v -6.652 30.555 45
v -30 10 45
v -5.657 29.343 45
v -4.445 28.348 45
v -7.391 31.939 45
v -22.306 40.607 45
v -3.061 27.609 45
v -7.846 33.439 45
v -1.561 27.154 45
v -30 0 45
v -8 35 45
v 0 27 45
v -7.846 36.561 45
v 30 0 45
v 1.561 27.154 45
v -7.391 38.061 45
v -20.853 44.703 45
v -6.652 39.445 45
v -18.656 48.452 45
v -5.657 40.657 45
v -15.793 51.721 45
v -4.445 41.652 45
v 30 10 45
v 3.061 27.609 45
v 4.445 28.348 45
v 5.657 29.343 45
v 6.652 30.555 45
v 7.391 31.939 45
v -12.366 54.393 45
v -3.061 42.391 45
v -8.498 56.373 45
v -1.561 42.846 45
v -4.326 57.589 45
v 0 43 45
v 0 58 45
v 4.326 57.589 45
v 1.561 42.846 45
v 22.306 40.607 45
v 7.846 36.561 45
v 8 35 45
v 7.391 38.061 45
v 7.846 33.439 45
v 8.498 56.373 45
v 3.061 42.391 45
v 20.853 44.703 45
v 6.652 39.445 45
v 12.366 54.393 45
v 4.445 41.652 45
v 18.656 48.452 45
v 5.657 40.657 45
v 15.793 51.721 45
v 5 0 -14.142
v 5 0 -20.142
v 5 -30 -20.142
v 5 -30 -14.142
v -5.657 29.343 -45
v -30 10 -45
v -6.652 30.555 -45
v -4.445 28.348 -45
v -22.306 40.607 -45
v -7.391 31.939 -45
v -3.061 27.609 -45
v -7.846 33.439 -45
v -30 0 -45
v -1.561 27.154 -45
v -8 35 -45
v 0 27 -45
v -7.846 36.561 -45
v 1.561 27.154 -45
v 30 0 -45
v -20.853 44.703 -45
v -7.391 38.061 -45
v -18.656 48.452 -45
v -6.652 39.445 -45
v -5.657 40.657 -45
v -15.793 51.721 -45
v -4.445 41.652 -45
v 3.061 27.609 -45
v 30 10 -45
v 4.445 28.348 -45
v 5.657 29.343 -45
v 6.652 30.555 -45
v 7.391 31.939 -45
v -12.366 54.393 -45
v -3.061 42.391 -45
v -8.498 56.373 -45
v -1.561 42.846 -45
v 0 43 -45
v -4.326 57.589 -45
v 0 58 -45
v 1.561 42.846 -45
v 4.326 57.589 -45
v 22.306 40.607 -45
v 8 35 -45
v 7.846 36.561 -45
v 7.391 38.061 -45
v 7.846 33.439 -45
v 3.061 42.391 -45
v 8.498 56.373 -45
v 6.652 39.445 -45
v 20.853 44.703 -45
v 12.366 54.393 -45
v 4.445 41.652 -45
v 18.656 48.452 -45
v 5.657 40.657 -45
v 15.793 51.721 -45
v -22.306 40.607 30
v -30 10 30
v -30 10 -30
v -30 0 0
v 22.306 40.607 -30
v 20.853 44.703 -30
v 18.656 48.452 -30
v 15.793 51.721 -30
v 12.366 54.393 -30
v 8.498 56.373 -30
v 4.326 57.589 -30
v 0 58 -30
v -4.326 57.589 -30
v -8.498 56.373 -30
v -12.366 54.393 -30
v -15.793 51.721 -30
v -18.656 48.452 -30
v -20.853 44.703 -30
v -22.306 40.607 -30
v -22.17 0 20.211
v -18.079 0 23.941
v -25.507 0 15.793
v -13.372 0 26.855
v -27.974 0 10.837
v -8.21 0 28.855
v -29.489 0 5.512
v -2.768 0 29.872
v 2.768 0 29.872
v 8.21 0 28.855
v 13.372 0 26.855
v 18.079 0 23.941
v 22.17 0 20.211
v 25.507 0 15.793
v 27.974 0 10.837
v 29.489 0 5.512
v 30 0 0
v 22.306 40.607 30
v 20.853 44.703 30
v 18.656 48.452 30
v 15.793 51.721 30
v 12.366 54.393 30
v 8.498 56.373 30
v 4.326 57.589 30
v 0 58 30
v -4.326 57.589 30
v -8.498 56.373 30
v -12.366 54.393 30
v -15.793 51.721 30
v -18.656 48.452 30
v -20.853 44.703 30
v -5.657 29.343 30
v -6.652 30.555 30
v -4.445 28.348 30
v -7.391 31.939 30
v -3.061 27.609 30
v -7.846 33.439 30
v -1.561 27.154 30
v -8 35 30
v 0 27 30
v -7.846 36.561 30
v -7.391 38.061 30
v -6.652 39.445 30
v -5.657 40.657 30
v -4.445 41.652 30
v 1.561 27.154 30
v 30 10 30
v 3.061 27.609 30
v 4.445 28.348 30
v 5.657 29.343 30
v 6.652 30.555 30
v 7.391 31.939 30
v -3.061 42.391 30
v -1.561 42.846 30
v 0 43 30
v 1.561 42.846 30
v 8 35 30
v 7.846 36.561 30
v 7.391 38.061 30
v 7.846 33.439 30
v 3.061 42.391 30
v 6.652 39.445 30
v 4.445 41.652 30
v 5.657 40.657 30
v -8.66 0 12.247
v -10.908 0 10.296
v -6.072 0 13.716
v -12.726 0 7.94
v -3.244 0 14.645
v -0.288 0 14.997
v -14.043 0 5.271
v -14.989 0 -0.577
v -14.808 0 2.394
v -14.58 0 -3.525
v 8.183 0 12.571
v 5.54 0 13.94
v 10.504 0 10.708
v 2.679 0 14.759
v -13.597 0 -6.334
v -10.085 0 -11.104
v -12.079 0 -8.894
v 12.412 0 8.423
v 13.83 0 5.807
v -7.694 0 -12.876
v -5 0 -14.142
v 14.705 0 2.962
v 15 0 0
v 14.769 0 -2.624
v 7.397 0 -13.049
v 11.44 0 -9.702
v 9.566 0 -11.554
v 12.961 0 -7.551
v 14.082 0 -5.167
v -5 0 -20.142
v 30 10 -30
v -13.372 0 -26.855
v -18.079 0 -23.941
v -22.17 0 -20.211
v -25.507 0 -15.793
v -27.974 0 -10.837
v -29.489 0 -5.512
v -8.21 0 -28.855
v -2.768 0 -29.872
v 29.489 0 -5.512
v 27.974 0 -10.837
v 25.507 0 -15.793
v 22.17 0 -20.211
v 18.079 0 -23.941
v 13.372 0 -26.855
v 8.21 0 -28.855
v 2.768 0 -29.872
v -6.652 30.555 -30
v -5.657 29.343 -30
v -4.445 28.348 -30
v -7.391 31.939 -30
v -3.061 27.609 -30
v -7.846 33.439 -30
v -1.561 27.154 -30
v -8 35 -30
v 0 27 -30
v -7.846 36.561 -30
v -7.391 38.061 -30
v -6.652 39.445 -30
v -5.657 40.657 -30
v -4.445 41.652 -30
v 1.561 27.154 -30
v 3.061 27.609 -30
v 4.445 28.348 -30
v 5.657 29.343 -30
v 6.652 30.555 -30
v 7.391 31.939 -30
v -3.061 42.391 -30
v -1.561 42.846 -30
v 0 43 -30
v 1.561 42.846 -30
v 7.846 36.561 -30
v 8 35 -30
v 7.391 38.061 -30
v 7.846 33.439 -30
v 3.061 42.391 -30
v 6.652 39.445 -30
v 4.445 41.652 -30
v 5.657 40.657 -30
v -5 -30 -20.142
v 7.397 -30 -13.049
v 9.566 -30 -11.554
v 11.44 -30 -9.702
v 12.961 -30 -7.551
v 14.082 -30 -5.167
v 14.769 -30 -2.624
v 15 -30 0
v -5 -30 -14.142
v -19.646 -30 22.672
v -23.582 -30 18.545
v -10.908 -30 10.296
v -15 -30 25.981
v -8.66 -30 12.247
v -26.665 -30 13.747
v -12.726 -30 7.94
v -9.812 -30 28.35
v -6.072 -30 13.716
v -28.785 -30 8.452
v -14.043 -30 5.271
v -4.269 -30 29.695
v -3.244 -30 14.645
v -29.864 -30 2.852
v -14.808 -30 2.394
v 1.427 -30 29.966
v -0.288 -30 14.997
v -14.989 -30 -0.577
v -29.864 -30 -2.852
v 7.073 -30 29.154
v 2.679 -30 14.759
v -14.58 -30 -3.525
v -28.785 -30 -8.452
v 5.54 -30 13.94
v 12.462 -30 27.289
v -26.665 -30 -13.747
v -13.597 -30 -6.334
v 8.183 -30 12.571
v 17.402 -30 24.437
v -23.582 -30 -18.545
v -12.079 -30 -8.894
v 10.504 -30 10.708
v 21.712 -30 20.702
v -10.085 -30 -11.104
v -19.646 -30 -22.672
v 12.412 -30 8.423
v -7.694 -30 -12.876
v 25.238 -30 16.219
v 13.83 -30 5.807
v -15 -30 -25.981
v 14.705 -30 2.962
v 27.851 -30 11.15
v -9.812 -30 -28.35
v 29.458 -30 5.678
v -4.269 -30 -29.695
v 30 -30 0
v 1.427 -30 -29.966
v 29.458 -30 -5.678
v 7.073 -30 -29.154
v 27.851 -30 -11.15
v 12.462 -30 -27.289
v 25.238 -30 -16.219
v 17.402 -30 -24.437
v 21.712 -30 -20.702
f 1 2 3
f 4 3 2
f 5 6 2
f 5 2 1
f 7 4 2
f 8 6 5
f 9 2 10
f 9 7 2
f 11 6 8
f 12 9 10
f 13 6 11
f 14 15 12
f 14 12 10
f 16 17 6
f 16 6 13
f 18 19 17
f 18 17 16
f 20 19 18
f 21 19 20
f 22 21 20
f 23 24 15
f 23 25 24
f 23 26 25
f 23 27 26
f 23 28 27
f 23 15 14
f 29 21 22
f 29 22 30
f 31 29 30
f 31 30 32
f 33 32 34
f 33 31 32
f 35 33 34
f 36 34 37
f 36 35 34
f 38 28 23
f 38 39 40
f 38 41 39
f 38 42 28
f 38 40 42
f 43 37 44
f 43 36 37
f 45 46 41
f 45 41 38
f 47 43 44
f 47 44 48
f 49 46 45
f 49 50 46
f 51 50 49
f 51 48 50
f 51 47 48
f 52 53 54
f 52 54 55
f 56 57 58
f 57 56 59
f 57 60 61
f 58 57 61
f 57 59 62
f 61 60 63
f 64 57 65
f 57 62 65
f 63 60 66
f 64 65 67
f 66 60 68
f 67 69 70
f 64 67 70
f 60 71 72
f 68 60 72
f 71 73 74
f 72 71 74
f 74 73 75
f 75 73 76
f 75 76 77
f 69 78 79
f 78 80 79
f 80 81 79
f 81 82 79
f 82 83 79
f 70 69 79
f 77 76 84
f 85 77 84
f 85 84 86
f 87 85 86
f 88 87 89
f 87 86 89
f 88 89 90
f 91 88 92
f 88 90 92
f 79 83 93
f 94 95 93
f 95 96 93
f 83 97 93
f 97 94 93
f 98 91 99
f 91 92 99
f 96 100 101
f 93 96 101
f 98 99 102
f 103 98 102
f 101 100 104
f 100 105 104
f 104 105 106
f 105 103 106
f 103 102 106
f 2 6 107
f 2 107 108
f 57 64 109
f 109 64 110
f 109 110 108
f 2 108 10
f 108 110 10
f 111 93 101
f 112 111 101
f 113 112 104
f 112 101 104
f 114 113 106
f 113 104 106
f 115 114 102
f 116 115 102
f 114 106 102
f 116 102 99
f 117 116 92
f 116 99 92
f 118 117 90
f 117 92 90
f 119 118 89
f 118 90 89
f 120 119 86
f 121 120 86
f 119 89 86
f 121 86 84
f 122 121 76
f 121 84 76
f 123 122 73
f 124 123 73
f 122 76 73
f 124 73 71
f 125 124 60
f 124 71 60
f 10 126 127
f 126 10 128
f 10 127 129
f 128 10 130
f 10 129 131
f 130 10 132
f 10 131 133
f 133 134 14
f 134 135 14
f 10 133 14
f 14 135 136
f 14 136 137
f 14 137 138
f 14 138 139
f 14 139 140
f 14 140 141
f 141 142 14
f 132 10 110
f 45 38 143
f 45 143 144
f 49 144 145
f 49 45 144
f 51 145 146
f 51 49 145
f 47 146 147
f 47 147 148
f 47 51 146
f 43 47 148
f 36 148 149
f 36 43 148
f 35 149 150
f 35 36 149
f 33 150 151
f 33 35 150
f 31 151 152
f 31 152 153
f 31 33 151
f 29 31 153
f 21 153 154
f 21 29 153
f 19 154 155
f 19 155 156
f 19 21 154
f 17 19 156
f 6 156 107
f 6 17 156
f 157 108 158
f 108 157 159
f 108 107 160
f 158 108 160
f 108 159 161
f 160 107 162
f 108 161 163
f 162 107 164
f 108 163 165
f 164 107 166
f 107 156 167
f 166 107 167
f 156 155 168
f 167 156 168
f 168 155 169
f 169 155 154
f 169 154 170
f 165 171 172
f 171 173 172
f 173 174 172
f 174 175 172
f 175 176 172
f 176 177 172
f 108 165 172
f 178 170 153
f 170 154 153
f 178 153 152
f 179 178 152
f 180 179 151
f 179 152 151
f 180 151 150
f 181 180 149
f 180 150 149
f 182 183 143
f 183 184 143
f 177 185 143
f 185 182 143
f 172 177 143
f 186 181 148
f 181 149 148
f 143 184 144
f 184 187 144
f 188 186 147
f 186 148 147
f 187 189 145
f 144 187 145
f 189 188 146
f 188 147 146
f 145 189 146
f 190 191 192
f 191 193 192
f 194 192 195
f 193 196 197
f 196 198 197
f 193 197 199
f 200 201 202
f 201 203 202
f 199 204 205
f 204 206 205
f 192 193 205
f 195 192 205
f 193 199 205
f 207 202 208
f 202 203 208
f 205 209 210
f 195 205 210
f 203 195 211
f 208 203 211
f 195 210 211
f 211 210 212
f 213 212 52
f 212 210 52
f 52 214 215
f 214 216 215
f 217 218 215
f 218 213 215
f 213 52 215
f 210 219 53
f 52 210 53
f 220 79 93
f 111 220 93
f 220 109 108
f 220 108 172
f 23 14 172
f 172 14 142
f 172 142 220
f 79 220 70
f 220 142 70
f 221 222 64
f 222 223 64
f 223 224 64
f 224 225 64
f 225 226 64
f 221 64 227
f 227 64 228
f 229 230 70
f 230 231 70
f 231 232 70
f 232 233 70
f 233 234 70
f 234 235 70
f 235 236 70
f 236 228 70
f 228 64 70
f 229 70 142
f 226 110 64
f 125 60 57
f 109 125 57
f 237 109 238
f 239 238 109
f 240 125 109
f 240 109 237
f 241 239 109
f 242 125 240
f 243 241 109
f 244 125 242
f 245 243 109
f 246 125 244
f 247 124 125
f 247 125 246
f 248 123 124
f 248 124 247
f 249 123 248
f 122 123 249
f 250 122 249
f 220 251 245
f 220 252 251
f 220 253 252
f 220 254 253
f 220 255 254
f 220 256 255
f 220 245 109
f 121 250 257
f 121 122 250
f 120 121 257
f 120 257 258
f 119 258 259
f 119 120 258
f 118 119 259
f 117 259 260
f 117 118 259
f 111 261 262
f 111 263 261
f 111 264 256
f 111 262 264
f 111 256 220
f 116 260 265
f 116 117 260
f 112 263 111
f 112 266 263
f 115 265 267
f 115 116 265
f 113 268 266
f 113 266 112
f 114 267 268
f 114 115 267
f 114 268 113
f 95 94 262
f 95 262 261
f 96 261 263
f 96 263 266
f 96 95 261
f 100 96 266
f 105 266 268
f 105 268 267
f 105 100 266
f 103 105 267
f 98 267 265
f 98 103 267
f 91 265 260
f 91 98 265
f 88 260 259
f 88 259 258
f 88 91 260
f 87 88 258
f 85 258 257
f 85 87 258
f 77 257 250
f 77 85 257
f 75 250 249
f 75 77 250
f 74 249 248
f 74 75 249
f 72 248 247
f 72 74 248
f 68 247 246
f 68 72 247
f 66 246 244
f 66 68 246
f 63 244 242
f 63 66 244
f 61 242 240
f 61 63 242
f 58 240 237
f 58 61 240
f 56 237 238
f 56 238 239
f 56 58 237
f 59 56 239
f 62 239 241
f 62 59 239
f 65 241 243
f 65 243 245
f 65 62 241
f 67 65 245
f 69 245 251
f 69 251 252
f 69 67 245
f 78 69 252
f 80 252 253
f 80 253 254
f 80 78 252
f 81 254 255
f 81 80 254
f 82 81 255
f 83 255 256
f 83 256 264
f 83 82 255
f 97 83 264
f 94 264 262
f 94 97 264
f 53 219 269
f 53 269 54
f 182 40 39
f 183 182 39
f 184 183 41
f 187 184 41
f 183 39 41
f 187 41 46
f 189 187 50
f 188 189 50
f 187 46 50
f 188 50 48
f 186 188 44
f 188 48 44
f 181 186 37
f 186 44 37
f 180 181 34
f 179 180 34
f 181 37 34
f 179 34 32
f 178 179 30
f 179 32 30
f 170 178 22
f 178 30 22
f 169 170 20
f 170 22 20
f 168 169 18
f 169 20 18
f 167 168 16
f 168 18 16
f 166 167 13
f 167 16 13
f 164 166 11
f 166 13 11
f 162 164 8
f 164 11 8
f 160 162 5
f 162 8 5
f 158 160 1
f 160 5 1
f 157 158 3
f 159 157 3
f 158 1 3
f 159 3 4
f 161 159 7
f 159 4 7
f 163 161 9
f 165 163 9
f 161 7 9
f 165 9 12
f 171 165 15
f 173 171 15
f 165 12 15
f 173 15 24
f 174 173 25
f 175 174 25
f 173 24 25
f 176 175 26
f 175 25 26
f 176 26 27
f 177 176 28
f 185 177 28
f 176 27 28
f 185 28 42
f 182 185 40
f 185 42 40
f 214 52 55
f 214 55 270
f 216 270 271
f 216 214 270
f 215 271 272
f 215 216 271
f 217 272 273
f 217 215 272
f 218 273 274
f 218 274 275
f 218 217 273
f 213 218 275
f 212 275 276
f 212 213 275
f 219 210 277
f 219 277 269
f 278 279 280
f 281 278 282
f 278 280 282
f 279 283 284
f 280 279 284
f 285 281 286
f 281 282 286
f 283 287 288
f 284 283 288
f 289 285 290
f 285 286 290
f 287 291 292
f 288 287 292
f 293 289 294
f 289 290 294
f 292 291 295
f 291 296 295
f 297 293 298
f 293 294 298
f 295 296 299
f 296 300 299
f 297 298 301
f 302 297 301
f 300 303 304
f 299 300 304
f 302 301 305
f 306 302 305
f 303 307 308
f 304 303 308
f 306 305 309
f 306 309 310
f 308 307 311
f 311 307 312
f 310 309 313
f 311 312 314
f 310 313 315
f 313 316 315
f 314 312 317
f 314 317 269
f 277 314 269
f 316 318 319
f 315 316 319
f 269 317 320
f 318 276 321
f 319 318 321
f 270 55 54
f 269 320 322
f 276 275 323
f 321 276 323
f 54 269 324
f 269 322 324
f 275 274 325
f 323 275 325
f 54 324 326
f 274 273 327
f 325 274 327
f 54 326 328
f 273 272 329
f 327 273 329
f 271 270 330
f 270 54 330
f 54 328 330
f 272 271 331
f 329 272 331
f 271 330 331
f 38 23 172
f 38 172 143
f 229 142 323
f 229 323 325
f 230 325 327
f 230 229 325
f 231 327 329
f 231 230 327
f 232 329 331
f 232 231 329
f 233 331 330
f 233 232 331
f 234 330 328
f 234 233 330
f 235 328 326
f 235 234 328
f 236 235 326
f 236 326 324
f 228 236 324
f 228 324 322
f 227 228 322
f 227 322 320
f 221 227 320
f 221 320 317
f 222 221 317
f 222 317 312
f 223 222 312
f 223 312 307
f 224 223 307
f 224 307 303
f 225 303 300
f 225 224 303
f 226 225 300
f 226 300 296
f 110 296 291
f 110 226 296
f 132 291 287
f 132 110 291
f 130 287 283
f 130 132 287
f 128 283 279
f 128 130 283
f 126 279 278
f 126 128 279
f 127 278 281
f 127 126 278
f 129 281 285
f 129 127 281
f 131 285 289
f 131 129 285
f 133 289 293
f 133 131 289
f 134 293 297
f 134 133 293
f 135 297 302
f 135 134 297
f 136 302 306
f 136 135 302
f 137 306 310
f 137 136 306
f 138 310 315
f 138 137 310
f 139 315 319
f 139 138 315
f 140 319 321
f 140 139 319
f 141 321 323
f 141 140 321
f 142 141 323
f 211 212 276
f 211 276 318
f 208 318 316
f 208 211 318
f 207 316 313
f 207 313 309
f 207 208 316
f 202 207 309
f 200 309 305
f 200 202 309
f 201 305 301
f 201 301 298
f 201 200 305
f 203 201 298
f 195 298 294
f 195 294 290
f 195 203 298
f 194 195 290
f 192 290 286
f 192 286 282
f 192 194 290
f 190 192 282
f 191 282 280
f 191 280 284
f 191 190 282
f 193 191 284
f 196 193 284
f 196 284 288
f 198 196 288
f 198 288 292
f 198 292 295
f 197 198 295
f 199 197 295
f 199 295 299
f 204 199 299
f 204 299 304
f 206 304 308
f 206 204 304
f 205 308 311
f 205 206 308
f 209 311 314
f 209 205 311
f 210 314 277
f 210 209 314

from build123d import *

# Parameters (mm, degrees)
SKETCH1_W           = 60
SKETCH1_H           = 90
BOSS_EXTRUDE1_DEPTH = 10
BOSS_EXTRUDE2_DEPTH = 30
SKETCH3_R           = 8
BOSS_EXTRUDE3_DEPTH = 15


with BuildPart() as part:
    # Sketch1 → Boss-Extrude1 (new body)
    with BuildSketch(Plane(origin=(0, 0, 0), x_dir=(1, 0, 0), z_dir=(0, 1, 0))):
        Rectangle(SKETCH1_W, SKETCH1_H)
    extrude(amount=BOSS_EXTRUDE1_DEPTH)

    # Sketch1<3> → Boss-Extrude2 (add)
    with BuildSketch(Plane(origin=(0, 0, 0), x_dir=(1, 0, 0), z_dir=(0, 1, 0))):
        with BuildLine():
            ThreePointArc((-30, -1.1e-08), (5e-09, -30), (30, 0))
            ThreePointArc((30, 0), (-5e-09, 30), (-30, -1.1e-08))
        make_face()
        with BuildLine():
            Line((5, 20.142135624), (5, 14.142135624))
            ThreePointArc((5, 14.142135624), (12.247448714, 8.660254038), (15, 0))
            ThreePointArc((15, 0), (-8.660254038, -12.247448714), (-5, 14.142135624))
            Line((-5, 14.142135624), (-5, 20.142135624))
            Line((-5, 20.142135624), (5, 20.142135624))
        make_face(mode=Mode.SUBTRACT)
    extrude(amount=-BOSS_EXTRUDE2_DEPTH)

    # Sketch3 → Boss-Extrude3 (add)
    with BuildSketch(Plane.XY.offset(45)):
        with BuildLine():
            Line((-22.306028796, 40.607234555), (-30, 10))
            Line((-30, 10), (30, 10))
            Line((30, 10), (22.306028796, 40.607234555))
            ThreePointArc((22.306028796, 40.607234555), (0, 58), (-22.306028796, 40.607234555))
        make_face()
        with Locations((0, 35)):
            Circle(SKETCH3_R, mode=Mode.SUBTRACT)
    boss_extrude3 = extrude(amount=-BOSS_EXTRUDE3_DEPTH)

    # Mirror1: Boss-Extrude3 across plane
    add(boss_extrude3.mirror(Plane.XY))


solid = part.part
